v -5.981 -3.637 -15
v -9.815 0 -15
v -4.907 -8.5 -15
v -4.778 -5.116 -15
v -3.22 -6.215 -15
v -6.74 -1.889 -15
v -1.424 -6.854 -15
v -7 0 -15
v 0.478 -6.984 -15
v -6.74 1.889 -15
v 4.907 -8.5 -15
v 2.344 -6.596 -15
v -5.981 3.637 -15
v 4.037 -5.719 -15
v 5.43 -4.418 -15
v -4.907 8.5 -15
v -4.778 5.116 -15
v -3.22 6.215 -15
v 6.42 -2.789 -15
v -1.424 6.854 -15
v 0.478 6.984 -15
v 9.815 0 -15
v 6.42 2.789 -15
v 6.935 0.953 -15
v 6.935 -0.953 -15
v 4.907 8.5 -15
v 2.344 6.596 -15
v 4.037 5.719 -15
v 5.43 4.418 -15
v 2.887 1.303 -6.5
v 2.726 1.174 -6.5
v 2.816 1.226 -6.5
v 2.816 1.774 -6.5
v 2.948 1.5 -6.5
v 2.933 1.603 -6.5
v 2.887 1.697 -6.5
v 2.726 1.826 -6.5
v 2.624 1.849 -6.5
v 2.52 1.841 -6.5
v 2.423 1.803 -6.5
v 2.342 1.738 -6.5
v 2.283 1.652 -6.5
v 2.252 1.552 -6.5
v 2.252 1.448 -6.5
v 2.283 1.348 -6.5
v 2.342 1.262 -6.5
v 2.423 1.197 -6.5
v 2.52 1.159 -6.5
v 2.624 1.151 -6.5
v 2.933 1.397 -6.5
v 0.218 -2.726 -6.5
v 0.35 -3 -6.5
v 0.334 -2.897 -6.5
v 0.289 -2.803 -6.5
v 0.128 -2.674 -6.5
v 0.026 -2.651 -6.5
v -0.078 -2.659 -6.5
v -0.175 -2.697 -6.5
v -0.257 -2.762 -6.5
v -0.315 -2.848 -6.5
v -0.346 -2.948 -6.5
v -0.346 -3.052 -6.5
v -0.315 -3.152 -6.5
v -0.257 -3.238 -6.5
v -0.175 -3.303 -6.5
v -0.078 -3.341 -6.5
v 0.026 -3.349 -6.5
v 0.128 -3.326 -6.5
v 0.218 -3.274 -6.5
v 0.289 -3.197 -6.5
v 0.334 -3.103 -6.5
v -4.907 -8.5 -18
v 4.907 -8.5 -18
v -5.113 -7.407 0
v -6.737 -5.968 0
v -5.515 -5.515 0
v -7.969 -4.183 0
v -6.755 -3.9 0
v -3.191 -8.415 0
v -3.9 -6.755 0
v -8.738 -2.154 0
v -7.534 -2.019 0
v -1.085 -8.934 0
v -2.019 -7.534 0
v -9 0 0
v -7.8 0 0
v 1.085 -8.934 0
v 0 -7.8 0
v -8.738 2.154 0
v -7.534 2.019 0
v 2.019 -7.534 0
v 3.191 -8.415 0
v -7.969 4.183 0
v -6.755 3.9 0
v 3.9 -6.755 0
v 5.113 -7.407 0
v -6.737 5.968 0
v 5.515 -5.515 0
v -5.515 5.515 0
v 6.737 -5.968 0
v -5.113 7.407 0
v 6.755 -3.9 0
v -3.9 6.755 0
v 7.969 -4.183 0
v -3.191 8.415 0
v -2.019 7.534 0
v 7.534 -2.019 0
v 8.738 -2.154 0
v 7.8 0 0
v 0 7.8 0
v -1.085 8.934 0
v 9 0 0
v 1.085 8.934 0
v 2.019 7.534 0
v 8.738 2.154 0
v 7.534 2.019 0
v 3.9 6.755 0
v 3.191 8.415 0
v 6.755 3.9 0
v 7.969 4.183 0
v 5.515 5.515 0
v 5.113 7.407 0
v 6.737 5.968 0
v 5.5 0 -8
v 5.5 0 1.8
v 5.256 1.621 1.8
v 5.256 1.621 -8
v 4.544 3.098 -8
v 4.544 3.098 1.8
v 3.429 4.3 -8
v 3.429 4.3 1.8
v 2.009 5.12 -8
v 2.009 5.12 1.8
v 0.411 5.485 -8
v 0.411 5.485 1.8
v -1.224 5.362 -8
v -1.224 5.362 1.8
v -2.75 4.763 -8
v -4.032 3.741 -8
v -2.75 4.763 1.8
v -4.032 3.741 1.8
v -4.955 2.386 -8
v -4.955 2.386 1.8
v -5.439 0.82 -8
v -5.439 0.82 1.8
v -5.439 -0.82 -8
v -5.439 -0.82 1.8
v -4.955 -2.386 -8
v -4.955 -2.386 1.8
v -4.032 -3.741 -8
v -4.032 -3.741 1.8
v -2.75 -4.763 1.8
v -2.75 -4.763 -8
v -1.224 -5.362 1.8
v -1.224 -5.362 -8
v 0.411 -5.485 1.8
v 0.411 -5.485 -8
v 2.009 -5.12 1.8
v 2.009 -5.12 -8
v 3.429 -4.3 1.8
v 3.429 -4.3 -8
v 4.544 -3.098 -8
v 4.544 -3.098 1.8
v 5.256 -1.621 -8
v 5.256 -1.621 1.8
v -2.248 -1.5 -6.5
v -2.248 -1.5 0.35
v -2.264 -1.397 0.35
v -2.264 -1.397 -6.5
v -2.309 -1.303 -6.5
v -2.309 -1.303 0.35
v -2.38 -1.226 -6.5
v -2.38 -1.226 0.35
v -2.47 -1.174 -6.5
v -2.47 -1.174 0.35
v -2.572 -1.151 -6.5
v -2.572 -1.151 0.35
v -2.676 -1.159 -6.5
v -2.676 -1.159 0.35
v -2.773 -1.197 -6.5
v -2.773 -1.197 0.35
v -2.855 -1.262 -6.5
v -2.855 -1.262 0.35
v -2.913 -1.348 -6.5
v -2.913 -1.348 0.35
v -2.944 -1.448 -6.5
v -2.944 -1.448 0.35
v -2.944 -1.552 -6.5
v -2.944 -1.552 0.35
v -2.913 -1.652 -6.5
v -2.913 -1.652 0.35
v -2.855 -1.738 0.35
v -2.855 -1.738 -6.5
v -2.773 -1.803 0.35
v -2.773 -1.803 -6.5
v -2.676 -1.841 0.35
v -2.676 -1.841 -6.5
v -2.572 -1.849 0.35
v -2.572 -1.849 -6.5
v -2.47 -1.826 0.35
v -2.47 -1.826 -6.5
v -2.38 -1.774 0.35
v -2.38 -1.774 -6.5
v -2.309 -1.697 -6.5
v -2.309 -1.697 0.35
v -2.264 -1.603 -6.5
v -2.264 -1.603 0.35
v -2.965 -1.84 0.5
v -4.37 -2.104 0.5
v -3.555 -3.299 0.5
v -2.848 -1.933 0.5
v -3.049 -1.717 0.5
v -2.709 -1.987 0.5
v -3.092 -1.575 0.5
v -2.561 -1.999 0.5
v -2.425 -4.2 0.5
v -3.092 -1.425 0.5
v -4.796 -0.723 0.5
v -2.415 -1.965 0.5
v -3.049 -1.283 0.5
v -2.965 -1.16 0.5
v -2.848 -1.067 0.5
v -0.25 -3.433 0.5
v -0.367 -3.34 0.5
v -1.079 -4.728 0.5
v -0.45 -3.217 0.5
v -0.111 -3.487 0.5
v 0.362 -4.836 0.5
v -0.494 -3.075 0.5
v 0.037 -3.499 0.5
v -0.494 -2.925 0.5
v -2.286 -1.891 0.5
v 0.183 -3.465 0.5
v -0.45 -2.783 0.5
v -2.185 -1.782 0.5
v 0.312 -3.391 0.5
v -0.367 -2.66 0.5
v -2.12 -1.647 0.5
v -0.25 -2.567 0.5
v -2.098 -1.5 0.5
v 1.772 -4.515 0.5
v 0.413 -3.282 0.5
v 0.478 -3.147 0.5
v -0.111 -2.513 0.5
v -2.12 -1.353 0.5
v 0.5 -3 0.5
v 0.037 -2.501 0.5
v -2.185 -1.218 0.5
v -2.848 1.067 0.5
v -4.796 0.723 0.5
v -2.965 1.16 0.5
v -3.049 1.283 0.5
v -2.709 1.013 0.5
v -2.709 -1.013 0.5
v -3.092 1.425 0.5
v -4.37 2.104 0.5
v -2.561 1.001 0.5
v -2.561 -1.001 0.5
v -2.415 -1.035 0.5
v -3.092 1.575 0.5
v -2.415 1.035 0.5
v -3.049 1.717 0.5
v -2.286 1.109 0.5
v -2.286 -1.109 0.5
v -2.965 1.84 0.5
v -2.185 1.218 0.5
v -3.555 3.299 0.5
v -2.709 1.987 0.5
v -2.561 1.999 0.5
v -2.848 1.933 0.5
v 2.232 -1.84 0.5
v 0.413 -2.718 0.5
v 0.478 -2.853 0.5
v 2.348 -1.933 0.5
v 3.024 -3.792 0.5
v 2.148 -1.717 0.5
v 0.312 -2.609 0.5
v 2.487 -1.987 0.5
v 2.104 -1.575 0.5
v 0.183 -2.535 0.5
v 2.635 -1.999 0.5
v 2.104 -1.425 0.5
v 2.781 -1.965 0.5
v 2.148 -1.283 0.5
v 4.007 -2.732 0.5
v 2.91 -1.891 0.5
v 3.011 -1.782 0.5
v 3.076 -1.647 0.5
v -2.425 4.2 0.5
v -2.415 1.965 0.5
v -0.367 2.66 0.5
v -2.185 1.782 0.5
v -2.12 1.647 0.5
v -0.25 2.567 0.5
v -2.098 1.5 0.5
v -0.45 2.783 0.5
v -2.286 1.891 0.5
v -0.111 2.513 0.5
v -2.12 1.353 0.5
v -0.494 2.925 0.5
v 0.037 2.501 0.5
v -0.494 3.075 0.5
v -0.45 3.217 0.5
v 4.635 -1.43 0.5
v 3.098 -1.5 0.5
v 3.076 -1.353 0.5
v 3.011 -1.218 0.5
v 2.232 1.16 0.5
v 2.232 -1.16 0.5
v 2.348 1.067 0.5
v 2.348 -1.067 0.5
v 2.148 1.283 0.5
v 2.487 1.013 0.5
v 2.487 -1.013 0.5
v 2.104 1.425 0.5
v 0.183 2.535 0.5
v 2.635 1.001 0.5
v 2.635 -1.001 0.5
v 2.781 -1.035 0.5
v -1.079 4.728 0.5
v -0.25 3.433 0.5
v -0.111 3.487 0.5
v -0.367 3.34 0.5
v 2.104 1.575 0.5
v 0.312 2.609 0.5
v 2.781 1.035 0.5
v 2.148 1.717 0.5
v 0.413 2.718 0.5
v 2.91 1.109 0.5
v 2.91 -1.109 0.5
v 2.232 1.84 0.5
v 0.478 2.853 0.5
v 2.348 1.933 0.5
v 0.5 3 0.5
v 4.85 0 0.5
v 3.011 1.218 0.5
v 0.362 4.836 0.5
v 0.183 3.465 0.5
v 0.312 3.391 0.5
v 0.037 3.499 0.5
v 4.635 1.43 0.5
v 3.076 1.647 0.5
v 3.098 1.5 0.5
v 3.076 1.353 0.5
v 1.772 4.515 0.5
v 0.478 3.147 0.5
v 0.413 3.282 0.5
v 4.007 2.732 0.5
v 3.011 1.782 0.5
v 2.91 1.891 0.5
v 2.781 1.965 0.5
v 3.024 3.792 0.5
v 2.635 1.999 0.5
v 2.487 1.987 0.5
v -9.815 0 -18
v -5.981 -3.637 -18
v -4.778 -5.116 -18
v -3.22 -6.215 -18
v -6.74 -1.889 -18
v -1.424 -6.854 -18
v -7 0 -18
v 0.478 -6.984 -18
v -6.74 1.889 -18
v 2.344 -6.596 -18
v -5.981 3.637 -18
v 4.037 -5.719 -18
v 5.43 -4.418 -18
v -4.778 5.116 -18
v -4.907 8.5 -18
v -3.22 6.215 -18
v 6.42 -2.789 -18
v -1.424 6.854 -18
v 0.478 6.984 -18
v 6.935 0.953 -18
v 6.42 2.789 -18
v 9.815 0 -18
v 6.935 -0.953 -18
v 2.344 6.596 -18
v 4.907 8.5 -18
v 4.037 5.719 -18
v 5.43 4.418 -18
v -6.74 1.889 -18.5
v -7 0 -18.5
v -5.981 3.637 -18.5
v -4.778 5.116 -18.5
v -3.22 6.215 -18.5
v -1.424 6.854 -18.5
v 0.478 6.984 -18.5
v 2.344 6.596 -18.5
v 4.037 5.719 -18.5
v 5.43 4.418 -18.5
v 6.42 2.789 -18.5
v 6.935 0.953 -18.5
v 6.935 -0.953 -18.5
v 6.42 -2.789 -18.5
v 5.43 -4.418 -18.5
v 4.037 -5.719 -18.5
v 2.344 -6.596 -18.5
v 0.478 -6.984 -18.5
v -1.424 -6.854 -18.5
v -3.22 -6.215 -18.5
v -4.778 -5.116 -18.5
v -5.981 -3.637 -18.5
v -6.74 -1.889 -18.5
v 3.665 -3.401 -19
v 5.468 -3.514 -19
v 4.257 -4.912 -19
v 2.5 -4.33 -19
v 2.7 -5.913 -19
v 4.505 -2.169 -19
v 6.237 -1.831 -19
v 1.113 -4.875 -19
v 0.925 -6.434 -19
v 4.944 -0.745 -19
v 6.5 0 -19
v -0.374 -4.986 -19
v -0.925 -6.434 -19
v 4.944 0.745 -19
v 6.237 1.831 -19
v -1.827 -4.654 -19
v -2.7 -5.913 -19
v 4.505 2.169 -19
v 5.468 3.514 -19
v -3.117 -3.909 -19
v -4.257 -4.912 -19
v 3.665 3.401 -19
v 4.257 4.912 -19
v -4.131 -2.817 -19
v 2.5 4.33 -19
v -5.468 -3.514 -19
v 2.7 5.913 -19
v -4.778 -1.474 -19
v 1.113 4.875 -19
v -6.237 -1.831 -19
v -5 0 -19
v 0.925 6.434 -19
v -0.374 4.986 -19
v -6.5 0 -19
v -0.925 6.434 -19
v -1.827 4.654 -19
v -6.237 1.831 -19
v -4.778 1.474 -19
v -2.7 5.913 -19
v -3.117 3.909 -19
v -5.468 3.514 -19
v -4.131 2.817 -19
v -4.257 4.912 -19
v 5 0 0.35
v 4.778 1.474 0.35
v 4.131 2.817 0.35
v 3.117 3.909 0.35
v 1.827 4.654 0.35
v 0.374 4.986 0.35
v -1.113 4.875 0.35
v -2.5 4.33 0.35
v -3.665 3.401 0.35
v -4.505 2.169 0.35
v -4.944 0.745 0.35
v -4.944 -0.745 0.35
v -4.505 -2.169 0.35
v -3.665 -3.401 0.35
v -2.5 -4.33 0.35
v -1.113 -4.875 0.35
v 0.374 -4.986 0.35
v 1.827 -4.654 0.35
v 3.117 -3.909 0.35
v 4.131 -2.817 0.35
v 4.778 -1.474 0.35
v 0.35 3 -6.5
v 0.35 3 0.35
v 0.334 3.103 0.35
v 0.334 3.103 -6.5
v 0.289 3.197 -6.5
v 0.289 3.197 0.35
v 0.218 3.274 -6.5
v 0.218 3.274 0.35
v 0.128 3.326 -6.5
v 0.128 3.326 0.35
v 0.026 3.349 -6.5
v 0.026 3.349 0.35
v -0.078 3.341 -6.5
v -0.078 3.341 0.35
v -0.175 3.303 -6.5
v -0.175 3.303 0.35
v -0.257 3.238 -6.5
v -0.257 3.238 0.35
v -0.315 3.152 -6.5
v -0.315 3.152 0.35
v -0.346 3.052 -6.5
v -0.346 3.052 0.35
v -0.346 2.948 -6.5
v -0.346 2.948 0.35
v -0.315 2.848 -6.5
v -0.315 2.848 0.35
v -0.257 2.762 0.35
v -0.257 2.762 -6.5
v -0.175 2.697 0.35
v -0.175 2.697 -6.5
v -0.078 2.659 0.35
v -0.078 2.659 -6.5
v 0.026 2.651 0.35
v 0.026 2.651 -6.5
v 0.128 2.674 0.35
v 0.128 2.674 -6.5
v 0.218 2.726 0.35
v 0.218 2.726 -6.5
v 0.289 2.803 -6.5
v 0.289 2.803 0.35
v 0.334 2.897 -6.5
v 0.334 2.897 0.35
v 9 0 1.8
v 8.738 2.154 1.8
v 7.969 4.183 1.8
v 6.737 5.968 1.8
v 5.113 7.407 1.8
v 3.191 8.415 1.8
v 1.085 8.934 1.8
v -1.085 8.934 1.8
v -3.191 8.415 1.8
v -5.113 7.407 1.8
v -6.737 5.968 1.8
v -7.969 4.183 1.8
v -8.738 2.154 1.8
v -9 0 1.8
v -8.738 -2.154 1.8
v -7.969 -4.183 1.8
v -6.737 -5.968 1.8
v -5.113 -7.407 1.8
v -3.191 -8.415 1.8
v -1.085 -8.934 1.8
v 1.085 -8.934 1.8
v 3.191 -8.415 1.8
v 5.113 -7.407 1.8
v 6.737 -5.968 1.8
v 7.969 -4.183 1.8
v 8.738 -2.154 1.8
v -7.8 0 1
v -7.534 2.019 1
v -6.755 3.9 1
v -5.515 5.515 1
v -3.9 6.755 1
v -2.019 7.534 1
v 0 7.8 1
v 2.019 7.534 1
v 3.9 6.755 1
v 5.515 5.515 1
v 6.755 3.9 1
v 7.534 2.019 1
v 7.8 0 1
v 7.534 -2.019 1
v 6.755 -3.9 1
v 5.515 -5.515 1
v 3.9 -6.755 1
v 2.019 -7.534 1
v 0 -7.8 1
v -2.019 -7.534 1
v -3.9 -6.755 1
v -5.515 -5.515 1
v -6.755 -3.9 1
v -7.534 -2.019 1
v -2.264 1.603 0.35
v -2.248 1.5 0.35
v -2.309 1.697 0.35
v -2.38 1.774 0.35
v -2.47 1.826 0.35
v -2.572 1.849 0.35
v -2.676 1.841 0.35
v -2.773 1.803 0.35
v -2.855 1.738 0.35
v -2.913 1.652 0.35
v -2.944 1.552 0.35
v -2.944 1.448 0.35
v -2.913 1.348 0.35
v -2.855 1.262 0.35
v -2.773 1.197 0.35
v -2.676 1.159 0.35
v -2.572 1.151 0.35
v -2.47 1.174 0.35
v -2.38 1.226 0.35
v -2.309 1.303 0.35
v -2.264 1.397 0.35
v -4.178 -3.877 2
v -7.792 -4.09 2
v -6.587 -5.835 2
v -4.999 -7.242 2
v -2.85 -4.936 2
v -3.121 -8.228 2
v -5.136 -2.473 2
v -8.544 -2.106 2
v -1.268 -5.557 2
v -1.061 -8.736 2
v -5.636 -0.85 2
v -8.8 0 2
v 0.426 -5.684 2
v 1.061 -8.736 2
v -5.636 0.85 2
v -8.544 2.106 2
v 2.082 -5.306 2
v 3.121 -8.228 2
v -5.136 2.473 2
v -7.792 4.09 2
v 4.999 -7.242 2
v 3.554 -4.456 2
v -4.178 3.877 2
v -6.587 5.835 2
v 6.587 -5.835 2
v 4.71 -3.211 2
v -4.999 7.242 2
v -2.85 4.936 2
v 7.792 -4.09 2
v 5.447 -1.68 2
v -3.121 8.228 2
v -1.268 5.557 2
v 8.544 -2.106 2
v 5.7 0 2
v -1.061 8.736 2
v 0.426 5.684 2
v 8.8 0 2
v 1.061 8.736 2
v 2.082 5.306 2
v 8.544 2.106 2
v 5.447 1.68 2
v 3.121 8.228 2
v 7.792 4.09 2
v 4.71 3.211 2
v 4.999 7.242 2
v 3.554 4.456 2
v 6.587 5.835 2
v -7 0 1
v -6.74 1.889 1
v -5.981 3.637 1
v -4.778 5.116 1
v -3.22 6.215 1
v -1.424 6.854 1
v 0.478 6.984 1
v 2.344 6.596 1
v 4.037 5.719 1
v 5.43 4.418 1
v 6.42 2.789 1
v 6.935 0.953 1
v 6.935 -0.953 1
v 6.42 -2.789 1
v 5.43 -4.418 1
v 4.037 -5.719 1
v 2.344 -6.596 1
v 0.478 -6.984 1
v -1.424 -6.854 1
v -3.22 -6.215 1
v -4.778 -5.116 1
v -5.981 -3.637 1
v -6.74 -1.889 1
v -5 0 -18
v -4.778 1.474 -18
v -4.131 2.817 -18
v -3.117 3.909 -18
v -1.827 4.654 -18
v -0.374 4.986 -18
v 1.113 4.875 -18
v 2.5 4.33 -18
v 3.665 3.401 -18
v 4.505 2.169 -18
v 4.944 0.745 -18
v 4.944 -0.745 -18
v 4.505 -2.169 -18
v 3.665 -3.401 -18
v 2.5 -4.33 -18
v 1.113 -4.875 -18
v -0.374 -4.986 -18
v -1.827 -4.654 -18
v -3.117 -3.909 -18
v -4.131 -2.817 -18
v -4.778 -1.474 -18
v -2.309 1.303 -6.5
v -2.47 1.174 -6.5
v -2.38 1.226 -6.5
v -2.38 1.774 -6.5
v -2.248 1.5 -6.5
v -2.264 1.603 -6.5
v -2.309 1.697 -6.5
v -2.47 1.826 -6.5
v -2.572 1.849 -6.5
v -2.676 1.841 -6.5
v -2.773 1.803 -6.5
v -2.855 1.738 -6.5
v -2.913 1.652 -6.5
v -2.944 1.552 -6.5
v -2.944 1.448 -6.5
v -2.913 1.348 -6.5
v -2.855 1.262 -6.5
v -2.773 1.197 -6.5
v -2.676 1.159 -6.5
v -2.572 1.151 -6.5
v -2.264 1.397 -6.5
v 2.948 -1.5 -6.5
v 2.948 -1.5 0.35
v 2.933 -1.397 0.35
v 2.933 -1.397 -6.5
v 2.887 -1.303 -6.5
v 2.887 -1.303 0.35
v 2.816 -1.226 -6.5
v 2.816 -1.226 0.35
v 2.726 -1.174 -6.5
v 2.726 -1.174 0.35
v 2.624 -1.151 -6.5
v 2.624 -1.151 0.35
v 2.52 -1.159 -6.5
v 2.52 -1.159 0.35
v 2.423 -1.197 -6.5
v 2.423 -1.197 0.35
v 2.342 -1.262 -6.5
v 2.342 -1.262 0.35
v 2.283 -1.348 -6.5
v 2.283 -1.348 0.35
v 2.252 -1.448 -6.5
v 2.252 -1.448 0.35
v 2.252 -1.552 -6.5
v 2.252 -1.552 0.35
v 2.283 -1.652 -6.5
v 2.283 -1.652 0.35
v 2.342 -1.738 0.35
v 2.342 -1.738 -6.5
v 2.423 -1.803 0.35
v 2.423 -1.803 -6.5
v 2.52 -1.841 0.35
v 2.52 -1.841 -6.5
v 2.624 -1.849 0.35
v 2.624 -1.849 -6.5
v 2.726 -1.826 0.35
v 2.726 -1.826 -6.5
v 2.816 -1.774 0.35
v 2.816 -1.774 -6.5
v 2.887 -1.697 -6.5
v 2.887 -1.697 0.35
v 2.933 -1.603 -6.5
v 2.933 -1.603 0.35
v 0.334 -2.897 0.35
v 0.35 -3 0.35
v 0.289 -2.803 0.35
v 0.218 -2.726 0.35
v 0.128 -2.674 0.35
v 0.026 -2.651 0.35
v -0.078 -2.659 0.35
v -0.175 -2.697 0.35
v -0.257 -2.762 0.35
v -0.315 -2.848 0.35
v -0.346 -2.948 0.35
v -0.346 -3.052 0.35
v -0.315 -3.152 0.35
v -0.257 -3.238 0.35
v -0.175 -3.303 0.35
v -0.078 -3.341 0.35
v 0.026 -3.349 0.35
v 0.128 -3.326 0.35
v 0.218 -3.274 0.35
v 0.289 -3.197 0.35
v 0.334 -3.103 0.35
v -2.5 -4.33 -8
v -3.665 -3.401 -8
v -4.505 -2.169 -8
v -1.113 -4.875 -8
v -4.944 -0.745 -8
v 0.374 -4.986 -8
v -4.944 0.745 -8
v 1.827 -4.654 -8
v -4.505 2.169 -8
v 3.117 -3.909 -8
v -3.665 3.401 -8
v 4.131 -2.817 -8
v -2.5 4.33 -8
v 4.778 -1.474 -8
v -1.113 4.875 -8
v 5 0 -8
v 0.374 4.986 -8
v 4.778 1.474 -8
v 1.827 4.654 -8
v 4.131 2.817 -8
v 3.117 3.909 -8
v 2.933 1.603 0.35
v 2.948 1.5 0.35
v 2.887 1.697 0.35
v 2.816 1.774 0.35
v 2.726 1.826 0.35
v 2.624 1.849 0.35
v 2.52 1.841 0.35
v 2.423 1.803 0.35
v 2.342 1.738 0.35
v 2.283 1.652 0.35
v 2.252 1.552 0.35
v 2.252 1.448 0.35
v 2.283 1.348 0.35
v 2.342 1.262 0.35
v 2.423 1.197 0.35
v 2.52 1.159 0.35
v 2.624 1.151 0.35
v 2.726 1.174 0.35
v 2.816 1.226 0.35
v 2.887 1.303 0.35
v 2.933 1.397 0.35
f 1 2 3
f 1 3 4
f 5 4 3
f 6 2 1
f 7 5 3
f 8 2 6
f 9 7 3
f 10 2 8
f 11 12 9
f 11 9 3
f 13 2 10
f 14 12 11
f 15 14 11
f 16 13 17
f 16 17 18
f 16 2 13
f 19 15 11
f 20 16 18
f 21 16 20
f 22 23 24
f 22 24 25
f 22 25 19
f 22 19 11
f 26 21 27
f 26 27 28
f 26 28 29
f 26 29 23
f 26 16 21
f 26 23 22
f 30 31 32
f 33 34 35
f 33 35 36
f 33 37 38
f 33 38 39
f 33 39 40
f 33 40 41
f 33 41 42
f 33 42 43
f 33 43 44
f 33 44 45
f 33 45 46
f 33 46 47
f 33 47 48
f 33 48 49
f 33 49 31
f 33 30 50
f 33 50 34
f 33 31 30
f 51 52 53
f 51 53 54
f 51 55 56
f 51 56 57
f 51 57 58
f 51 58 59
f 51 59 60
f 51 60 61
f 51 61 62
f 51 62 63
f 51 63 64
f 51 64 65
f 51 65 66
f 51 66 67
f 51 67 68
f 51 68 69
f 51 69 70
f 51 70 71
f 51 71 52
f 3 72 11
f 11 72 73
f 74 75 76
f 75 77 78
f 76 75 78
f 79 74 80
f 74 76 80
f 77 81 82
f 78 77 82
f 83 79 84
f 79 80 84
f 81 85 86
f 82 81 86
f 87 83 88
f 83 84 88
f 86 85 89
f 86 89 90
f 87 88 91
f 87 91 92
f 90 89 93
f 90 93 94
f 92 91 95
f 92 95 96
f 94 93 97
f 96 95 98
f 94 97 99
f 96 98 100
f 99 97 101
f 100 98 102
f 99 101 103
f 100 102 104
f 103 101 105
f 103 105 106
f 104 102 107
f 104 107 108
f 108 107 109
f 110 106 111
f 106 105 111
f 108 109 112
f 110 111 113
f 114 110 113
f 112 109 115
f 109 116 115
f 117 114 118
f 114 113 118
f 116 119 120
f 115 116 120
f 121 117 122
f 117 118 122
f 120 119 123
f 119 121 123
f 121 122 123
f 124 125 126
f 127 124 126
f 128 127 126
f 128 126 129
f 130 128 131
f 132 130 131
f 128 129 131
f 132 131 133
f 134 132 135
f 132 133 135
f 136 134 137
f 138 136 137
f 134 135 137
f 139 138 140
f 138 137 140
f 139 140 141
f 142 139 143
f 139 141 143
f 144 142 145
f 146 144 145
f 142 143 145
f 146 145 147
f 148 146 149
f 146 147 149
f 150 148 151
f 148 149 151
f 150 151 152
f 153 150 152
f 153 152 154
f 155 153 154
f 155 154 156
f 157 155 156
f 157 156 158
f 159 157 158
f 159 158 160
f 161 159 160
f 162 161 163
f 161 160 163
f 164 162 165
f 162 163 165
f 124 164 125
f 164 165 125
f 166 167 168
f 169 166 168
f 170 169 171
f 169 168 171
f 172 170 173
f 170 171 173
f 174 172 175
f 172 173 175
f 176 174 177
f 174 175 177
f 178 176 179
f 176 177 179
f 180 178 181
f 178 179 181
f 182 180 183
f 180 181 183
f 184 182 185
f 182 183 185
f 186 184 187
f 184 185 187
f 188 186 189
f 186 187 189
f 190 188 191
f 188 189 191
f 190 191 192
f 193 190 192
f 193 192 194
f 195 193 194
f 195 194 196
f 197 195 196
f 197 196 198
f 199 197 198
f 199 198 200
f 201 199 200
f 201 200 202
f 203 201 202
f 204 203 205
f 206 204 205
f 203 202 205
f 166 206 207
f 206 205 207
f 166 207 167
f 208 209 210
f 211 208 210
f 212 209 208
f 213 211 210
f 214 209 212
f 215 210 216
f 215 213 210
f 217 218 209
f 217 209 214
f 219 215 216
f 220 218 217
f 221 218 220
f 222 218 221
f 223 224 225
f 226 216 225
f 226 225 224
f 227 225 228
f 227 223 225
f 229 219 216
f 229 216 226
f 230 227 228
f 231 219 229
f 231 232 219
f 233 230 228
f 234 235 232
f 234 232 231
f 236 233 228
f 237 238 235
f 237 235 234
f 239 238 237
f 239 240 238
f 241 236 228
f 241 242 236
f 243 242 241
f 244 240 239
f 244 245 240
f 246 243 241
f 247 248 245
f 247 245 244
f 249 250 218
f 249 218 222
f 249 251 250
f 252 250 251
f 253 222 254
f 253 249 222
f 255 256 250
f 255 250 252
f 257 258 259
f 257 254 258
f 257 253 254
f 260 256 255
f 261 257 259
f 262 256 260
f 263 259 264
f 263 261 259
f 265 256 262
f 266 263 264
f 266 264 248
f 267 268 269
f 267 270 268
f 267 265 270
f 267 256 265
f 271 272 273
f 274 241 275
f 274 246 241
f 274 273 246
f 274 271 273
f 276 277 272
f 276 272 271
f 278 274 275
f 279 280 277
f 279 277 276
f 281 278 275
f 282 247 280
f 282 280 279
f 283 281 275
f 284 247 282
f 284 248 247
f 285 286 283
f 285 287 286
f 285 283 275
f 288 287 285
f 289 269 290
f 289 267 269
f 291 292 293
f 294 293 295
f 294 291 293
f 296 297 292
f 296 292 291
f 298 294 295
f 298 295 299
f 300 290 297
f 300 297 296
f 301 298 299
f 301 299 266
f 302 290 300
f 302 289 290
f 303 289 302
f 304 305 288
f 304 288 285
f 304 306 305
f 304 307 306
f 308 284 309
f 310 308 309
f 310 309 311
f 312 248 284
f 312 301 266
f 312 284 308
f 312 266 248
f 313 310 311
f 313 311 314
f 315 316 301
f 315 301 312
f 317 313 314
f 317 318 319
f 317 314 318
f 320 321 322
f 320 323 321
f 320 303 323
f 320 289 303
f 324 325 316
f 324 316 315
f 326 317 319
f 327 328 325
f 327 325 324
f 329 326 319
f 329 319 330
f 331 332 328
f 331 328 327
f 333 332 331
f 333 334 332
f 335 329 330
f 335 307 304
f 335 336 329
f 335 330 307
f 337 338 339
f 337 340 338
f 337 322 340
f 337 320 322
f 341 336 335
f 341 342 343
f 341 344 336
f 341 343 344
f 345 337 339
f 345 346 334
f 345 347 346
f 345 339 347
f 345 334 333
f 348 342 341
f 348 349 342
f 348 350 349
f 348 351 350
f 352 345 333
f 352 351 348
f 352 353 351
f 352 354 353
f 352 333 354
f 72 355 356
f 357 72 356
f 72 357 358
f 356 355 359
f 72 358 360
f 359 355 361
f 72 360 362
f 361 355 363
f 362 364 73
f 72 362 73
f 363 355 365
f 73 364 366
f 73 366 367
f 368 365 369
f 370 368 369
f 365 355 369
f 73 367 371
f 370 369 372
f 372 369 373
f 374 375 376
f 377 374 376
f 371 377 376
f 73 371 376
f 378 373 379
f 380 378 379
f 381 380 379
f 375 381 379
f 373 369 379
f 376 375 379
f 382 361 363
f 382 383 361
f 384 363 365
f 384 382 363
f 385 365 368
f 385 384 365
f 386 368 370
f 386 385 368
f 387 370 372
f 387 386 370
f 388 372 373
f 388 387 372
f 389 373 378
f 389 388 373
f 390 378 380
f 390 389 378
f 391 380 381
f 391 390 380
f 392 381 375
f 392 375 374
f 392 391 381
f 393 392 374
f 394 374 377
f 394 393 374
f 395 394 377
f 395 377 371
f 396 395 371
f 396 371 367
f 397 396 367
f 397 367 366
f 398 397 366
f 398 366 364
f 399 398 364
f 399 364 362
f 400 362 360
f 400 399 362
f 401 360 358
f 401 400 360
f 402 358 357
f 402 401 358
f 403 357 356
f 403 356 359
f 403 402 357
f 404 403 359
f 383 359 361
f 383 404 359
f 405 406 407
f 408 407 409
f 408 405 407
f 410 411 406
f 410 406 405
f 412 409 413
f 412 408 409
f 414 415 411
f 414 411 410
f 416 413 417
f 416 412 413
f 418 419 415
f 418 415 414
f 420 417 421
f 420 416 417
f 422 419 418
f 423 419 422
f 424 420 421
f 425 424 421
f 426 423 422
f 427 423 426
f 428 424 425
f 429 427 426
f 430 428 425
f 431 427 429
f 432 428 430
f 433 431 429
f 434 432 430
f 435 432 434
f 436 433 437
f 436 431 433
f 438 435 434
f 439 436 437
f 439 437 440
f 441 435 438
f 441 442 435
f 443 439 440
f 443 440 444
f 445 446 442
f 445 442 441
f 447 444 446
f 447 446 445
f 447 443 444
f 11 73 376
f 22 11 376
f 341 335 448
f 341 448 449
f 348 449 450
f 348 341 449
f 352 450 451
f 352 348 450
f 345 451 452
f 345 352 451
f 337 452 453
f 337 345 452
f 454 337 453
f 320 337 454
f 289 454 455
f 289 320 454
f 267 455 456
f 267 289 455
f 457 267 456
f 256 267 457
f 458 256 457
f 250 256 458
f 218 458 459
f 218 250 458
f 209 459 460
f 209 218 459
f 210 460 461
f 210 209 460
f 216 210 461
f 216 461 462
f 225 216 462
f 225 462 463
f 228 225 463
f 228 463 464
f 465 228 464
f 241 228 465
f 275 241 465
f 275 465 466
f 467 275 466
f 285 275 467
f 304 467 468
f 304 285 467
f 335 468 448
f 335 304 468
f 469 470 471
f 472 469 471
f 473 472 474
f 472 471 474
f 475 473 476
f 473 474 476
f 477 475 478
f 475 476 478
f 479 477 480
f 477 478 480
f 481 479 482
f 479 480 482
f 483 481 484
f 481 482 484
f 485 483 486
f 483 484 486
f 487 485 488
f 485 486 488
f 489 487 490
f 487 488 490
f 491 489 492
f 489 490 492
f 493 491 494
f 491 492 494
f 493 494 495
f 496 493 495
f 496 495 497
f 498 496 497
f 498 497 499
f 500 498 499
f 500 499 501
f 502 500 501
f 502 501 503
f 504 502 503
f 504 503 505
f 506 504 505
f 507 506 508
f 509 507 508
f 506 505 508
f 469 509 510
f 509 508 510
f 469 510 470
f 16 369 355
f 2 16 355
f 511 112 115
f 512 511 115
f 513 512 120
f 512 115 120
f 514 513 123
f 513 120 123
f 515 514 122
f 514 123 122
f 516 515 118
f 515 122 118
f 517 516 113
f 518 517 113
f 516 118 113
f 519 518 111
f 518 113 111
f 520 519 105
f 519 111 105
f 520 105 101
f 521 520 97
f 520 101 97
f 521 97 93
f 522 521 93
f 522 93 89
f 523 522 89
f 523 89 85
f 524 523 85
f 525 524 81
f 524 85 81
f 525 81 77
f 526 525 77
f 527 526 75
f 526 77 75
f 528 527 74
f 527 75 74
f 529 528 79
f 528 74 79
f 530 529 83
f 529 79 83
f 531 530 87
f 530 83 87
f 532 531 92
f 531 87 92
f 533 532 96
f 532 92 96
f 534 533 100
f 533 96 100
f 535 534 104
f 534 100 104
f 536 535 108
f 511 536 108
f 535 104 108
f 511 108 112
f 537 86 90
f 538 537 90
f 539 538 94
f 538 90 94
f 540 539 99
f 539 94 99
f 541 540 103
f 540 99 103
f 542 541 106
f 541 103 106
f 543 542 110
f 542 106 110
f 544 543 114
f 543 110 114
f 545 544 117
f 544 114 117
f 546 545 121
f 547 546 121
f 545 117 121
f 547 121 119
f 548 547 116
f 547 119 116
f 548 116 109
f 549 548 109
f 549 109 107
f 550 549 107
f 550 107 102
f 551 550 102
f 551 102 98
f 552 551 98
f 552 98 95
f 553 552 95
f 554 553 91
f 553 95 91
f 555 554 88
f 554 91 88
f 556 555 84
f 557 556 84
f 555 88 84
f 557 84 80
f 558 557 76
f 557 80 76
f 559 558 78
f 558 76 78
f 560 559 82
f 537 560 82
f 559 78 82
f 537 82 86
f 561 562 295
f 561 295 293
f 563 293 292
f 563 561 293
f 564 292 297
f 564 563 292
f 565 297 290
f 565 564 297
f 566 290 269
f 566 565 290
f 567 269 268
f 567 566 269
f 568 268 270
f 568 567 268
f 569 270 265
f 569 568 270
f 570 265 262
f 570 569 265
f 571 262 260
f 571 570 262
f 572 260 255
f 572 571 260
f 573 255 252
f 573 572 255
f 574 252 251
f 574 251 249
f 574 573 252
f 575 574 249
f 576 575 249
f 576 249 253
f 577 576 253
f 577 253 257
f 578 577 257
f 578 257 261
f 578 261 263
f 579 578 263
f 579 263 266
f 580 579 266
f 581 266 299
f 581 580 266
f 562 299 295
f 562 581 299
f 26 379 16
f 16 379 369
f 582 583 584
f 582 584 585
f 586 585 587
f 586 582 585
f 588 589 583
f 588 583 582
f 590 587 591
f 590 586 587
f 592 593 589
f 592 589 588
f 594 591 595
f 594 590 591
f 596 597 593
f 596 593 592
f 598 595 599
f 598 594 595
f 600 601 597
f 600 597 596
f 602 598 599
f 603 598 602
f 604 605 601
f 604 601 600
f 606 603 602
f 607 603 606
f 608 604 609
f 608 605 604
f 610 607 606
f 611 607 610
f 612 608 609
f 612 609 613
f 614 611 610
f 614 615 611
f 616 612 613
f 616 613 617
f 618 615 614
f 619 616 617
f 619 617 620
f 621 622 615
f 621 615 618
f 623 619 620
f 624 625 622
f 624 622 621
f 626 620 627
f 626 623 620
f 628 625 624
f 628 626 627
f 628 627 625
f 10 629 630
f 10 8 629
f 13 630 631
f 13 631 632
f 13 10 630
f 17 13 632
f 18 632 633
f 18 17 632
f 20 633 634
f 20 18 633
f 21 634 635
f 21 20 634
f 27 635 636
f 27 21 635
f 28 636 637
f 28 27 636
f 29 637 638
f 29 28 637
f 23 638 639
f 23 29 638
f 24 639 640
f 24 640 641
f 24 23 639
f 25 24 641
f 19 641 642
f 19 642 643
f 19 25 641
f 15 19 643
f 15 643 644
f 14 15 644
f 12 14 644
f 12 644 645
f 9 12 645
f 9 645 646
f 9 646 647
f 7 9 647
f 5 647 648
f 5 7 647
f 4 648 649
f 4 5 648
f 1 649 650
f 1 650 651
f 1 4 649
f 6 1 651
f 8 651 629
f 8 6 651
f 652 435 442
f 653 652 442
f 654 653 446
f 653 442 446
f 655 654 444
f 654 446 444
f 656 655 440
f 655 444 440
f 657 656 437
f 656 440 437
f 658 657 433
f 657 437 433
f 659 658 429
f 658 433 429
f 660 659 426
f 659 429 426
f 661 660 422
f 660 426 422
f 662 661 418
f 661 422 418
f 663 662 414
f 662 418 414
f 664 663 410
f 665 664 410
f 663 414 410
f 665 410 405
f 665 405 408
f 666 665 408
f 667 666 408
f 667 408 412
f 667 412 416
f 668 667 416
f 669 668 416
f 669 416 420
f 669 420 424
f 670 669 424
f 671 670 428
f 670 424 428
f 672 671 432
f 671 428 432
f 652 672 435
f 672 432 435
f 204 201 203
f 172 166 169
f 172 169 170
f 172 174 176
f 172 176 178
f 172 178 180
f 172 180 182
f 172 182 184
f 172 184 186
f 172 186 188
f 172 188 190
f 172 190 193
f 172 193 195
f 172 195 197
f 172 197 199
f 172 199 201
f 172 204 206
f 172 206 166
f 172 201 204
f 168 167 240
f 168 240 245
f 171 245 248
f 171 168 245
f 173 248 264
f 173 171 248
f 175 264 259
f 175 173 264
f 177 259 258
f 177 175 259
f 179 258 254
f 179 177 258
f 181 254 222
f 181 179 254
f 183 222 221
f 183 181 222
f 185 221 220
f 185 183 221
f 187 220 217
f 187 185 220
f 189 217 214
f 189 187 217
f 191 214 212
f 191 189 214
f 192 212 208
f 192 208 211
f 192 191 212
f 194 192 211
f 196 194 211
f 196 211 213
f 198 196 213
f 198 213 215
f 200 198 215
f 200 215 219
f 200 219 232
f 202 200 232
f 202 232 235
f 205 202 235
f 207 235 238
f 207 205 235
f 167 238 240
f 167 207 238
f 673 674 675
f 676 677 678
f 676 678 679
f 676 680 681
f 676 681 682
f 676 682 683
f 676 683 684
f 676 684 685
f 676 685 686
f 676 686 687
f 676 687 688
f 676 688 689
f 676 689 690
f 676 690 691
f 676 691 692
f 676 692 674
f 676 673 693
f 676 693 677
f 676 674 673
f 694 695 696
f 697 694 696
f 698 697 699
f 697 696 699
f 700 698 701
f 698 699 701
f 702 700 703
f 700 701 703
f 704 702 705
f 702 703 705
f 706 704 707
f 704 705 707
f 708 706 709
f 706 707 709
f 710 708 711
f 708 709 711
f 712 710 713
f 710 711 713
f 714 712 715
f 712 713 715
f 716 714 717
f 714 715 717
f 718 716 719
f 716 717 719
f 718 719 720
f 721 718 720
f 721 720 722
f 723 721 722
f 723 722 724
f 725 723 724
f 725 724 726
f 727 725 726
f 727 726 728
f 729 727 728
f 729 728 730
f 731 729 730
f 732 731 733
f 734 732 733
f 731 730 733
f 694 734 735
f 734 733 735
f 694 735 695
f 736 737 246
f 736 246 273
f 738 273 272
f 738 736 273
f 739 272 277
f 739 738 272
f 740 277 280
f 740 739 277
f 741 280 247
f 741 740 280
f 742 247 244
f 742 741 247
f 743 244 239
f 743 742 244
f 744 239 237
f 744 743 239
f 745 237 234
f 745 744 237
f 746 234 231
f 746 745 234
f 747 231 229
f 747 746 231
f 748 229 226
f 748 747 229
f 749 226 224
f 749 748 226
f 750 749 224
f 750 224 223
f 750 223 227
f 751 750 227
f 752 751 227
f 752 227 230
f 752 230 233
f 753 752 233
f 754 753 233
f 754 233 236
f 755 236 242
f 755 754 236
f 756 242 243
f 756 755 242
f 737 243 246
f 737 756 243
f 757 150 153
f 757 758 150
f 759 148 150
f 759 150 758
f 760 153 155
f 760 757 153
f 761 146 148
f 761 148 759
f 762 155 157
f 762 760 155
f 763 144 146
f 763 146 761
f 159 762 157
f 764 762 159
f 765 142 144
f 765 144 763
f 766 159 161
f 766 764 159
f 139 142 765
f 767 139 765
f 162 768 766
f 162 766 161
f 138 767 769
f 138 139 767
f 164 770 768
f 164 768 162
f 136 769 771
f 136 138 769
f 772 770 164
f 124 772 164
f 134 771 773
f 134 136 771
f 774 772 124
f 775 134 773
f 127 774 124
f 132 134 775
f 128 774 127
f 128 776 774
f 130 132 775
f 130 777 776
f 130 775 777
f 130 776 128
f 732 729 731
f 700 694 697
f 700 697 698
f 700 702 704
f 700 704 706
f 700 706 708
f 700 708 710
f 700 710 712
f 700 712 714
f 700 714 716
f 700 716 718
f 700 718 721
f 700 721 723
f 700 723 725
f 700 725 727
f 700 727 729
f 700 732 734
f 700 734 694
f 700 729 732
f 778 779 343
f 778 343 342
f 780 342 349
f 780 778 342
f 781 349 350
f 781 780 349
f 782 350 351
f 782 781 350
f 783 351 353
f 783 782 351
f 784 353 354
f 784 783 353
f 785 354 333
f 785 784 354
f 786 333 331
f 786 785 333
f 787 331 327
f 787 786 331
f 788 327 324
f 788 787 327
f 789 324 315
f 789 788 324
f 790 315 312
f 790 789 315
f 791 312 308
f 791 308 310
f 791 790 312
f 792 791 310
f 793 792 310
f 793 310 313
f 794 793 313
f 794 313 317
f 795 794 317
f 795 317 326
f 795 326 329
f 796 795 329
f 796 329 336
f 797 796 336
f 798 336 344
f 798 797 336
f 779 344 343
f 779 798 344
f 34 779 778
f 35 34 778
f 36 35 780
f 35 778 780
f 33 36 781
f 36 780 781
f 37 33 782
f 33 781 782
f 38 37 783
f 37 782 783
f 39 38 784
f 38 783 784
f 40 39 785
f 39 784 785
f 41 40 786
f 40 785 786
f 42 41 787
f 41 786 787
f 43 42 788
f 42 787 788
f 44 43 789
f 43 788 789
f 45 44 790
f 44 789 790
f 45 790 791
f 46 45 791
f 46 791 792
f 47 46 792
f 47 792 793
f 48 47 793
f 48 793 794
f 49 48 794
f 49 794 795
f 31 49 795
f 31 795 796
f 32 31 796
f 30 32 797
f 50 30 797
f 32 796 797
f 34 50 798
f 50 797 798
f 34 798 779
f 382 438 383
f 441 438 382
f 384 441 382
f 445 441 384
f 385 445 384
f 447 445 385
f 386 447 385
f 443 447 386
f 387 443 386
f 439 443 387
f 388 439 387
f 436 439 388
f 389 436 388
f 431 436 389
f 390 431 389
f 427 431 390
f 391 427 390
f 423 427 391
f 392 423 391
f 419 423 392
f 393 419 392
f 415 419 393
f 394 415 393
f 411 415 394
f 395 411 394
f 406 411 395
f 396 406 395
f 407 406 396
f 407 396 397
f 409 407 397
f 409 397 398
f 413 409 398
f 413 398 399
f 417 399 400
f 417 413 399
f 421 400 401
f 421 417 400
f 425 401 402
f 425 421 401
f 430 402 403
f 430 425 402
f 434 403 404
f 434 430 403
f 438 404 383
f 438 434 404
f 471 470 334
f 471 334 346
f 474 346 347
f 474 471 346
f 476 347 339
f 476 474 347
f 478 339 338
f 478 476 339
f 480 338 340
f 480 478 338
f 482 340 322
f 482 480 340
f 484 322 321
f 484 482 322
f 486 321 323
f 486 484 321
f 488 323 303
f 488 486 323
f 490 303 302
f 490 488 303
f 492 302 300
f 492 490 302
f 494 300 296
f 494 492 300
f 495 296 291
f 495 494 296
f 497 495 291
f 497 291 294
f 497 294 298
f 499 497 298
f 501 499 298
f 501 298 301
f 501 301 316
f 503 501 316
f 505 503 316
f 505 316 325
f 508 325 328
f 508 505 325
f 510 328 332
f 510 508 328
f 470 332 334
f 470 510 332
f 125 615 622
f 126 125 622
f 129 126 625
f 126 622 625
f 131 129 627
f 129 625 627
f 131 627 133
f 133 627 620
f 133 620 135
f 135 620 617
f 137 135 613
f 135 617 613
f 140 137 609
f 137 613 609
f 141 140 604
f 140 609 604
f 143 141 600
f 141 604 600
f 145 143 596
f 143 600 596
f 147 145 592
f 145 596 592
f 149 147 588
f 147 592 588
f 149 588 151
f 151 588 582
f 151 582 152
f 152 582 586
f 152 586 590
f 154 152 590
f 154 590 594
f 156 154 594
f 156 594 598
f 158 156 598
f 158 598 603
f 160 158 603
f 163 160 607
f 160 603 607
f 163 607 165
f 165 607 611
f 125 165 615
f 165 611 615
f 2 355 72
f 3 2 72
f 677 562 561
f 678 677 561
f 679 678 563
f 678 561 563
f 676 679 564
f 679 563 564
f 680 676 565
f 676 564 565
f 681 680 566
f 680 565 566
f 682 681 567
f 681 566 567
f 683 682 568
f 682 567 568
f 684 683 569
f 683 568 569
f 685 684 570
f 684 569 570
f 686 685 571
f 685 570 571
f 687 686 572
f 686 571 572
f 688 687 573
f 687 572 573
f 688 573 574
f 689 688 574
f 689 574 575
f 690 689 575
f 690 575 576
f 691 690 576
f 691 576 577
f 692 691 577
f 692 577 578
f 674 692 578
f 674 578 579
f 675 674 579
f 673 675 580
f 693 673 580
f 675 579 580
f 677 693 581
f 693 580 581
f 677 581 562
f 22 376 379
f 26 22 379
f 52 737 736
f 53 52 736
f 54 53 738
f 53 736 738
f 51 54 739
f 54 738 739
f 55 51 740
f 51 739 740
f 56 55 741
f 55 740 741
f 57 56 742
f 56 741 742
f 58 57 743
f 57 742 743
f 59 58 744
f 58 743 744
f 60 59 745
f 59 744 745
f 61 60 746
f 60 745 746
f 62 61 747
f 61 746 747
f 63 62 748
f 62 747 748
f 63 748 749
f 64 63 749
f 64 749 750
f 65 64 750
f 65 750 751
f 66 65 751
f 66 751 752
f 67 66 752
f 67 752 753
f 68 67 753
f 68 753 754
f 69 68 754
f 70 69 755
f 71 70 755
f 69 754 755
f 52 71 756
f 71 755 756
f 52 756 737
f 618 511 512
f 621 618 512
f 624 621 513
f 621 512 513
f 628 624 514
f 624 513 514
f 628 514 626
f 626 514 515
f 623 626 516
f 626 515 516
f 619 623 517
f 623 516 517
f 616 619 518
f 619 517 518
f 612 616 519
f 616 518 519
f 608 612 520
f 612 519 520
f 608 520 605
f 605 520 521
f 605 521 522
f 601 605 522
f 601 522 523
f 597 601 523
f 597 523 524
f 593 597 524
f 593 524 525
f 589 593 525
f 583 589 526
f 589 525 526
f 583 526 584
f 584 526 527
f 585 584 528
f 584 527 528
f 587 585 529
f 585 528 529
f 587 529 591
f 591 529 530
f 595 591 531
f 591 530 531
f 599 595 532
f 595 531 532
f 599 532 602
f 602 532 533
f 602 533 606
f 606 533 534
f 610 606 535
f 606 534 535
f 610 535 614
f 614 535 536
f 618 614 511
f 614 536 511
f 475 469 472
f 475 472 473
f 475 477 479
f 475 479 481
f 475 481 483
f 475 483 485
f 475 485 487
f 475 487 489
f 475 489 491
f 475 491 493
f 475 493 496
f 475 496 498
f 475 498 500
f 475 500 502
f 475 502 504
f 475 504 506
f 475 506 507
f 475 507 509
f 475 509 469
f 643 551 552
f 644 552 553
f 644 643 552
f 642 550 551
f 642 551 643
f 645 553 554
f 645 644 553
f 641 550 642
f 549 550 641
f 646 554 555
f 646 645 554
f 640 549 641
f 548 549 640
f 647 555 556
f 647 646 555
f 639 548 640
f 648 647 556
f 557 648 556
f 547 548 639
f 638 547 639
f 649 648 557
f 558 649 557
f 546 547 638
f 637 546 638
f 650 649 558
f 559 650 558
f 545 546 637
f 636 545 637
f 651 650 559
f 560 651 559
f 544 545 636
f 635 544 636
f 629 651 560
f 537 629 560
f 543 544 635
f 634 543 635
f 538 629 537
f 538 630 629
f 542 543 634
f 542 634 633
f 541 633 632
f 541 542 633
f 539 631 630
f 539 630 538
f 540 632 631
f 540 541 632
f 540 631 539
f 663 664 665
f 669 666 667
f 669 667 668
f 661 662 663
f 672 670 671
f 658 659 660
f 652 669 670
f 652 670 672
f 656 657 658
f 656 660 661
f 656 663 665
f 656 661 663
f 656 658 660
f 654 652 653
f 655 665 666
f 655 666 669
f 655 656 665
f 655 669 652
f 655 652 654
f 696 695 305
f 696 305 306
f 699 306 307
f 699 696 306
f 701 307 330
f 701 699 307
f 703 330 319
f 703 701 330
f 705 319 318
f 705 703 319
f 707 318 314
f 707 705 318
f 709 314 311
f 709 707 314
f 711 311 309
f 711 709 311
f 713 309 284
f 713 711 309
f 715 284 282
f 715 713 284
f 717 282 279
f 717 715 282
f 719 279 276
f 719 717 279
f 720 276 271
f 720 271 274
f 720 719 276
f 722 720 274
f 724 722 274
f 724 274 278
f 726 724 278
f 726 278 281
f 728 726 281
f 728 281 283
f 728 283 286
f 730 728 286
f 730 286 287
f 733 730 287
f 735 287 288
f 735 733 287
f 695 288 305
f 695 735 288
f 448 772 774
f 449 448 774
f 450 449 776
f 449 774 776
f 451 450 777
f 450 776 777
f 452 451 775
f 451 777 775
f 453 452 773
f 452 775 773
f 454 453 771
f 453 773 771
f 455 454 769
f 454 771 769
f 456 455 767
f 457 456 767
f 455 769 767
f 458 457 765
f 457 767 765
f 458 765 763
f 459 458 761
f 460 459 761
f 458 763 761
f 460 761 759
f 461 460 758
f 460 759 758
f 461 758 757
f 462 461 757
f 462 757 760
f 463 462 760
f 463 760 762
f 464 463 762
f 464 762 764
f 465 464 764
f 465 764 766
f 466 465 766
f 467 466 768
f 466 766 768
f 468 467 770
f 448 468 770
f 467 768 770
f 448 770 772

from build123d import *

# Parameters (mm, degrees)
SKETCH1_R          = 9
EXTRUDE1_DEPTH     = 2
SKETCH4_R          = 7
EXTRUDE2_DEPTH     = 19
SKETCH2_R          = 5.5
CUT_EXTRUDE1_DEPTH = 10
SKETCH3_R          = 7.8
SKETCH3_R_2        = 7
CUT_EXTRUDE2_DEPTH = 1
SKETCH5_R          = 5
EXTRUDE3_DEPTH     = 8.5
SKETCH6_R          = 0.35
CUT_EXTRUDE3_DEPTH = 7
CHAMFER2_SIZE      = 0.15
CHAMFER1_SIZE      = 0.2
SKETCH7_R          = 5
CUT_EXTRUDE4_DEPTH = 1
CHAMFER3_SIZE      = 0.5
EXTRUDE4_DEPTH     = 3


with BuildPart() as part:
    # Sketch1 → Extrude1 (new body)
    with BuildSketch(Plane.XY):
        Circle(SKETCH1_R)
    extrude(amount=EXTRUDE1_DEPTH)

    # Sketch4 → Extrude2 (add)
    with BuildSketch(Plane(origin=(0, 0, 0), x_dir=(-1, 0, 0), z_dir=(0, 0, -1))):
        Circle(SKETCH4_R)
    extrude(amount=EXTRUDE2_DEPTH)

    # Sketch2 → Cut-Extrude1 (cut)
    with BuildSketch(Plane.XY.offset(2)):
        Circle(SKETCH2_R)
    extrude(amount=-CUT_EXTRUDE1_DEPTH, mode=Mode.SUBTRACT)

    # Sketch3 → Cut-Extrude2 (cut)
    with BuildSketch(Plane(origin=(0, 0, 0), x_dir=(-1, 0, 0), z_dir=(0, 0, -1))):
        Circle(SKETCH3_R)
        Circle(SKETCH3_R_2, mode=Mode.SUBTRACT)
    extrude(amount=-CUT_EXTRUDE2_DEPTH, mode=Mode.SUBTRACT)

    # Sketch5 → Extrude3 (add)
    with BuildSketch(Plane.XY.offset(-8)):
        Circle(SKETCH5_R)
    extrude(amount=EXTRUDE3_DEPTH)

    # Sketch6 → Cut-Extrude3 (cut)
    with BuildSketch(Plane.XY.offset(0.5)):
        with Locations((0, 3)):
            Circle(SKETCH6_R)
        with Locations((0, -3)):
            Circle(SKETCH6_R)
        with Locations((2.598076211, 1.5)):
            Circle(SKETCH6_R)
        with Locations((2.598076211, -1.5)):
            Circle(SKETCH6_R)
        with Locations((-2.598076211, 1.5)):
            Circle(SKETCH6_R)
        with Locations((-2.598076211, -1.5)):
            Circle(SKETCH6_R)
    extrude(amount=-CUT_EXTRUDE3_DEPTH, mode=Mode.SUBTRACT)

    # Chamfer2
    chamfer2_edges = [part.edges().sort_by_distance(p)[0] for p in [
        (-5, 0, 0.5),
        (-0.35, 3, 0.5),
        (-0.35, -3, 0.5),
        (2.248076211, 1.5, 0.5),
        (2.248076211, -1.5, 0.5),
        (-2.948076211, 1.5, 0.5),
        (-2.948076211, -1.5, 0.5),
    ]]
    chamfer(chamfer2_edges, length=CHAMFER2_SIZE)

    # Chamfer1
    chamfer1_edges = [part.edges().sort_by_distance(p)[0] for p in [
        (-5.5, 0, 2),
        (-9, 0, 2),
    ]]
    chamfer(chamfer1_edges, length=CHAMFER1_SIZE)

    # Sketch7 → Cut-Extrude4 (cut)
    with BuildSketch(Plane(origin=(0, 0, -19), x_dir=(-1, 0, 0), z_dir=(0, 0, -1))):
        Circle(SKETCH7_R)
    extrude(amount=-CUT_EXTRUDE4_DEPTH, mode=Mode.SUBTRACT)

    # Chamfer3
    chamfer3_edges = [part.edges().sort_by_distance(p)[0] for p in [
        (7, 0, -19),
    ]]
    chamfer(chamfer3_edges, length=CHAMFER3_SIZE)

    # Sketch8 → Extrude4 (add)
    with BuildSketch(Plane(origin=(0, 0, -18), x_dir=(-1, 0, 0), z_dir=(0, 0, -1))):
        Polygon((-4.907477288, 8.5), (4.907477288, 8.5), (9.814954576, 0), (4.907477288, -8.5), (-4.907477288, -8.5), (-9.814954576, 0), align=None)
    extrude(amount=-EXTRUDE4_DEPTH)


solid = part.part
